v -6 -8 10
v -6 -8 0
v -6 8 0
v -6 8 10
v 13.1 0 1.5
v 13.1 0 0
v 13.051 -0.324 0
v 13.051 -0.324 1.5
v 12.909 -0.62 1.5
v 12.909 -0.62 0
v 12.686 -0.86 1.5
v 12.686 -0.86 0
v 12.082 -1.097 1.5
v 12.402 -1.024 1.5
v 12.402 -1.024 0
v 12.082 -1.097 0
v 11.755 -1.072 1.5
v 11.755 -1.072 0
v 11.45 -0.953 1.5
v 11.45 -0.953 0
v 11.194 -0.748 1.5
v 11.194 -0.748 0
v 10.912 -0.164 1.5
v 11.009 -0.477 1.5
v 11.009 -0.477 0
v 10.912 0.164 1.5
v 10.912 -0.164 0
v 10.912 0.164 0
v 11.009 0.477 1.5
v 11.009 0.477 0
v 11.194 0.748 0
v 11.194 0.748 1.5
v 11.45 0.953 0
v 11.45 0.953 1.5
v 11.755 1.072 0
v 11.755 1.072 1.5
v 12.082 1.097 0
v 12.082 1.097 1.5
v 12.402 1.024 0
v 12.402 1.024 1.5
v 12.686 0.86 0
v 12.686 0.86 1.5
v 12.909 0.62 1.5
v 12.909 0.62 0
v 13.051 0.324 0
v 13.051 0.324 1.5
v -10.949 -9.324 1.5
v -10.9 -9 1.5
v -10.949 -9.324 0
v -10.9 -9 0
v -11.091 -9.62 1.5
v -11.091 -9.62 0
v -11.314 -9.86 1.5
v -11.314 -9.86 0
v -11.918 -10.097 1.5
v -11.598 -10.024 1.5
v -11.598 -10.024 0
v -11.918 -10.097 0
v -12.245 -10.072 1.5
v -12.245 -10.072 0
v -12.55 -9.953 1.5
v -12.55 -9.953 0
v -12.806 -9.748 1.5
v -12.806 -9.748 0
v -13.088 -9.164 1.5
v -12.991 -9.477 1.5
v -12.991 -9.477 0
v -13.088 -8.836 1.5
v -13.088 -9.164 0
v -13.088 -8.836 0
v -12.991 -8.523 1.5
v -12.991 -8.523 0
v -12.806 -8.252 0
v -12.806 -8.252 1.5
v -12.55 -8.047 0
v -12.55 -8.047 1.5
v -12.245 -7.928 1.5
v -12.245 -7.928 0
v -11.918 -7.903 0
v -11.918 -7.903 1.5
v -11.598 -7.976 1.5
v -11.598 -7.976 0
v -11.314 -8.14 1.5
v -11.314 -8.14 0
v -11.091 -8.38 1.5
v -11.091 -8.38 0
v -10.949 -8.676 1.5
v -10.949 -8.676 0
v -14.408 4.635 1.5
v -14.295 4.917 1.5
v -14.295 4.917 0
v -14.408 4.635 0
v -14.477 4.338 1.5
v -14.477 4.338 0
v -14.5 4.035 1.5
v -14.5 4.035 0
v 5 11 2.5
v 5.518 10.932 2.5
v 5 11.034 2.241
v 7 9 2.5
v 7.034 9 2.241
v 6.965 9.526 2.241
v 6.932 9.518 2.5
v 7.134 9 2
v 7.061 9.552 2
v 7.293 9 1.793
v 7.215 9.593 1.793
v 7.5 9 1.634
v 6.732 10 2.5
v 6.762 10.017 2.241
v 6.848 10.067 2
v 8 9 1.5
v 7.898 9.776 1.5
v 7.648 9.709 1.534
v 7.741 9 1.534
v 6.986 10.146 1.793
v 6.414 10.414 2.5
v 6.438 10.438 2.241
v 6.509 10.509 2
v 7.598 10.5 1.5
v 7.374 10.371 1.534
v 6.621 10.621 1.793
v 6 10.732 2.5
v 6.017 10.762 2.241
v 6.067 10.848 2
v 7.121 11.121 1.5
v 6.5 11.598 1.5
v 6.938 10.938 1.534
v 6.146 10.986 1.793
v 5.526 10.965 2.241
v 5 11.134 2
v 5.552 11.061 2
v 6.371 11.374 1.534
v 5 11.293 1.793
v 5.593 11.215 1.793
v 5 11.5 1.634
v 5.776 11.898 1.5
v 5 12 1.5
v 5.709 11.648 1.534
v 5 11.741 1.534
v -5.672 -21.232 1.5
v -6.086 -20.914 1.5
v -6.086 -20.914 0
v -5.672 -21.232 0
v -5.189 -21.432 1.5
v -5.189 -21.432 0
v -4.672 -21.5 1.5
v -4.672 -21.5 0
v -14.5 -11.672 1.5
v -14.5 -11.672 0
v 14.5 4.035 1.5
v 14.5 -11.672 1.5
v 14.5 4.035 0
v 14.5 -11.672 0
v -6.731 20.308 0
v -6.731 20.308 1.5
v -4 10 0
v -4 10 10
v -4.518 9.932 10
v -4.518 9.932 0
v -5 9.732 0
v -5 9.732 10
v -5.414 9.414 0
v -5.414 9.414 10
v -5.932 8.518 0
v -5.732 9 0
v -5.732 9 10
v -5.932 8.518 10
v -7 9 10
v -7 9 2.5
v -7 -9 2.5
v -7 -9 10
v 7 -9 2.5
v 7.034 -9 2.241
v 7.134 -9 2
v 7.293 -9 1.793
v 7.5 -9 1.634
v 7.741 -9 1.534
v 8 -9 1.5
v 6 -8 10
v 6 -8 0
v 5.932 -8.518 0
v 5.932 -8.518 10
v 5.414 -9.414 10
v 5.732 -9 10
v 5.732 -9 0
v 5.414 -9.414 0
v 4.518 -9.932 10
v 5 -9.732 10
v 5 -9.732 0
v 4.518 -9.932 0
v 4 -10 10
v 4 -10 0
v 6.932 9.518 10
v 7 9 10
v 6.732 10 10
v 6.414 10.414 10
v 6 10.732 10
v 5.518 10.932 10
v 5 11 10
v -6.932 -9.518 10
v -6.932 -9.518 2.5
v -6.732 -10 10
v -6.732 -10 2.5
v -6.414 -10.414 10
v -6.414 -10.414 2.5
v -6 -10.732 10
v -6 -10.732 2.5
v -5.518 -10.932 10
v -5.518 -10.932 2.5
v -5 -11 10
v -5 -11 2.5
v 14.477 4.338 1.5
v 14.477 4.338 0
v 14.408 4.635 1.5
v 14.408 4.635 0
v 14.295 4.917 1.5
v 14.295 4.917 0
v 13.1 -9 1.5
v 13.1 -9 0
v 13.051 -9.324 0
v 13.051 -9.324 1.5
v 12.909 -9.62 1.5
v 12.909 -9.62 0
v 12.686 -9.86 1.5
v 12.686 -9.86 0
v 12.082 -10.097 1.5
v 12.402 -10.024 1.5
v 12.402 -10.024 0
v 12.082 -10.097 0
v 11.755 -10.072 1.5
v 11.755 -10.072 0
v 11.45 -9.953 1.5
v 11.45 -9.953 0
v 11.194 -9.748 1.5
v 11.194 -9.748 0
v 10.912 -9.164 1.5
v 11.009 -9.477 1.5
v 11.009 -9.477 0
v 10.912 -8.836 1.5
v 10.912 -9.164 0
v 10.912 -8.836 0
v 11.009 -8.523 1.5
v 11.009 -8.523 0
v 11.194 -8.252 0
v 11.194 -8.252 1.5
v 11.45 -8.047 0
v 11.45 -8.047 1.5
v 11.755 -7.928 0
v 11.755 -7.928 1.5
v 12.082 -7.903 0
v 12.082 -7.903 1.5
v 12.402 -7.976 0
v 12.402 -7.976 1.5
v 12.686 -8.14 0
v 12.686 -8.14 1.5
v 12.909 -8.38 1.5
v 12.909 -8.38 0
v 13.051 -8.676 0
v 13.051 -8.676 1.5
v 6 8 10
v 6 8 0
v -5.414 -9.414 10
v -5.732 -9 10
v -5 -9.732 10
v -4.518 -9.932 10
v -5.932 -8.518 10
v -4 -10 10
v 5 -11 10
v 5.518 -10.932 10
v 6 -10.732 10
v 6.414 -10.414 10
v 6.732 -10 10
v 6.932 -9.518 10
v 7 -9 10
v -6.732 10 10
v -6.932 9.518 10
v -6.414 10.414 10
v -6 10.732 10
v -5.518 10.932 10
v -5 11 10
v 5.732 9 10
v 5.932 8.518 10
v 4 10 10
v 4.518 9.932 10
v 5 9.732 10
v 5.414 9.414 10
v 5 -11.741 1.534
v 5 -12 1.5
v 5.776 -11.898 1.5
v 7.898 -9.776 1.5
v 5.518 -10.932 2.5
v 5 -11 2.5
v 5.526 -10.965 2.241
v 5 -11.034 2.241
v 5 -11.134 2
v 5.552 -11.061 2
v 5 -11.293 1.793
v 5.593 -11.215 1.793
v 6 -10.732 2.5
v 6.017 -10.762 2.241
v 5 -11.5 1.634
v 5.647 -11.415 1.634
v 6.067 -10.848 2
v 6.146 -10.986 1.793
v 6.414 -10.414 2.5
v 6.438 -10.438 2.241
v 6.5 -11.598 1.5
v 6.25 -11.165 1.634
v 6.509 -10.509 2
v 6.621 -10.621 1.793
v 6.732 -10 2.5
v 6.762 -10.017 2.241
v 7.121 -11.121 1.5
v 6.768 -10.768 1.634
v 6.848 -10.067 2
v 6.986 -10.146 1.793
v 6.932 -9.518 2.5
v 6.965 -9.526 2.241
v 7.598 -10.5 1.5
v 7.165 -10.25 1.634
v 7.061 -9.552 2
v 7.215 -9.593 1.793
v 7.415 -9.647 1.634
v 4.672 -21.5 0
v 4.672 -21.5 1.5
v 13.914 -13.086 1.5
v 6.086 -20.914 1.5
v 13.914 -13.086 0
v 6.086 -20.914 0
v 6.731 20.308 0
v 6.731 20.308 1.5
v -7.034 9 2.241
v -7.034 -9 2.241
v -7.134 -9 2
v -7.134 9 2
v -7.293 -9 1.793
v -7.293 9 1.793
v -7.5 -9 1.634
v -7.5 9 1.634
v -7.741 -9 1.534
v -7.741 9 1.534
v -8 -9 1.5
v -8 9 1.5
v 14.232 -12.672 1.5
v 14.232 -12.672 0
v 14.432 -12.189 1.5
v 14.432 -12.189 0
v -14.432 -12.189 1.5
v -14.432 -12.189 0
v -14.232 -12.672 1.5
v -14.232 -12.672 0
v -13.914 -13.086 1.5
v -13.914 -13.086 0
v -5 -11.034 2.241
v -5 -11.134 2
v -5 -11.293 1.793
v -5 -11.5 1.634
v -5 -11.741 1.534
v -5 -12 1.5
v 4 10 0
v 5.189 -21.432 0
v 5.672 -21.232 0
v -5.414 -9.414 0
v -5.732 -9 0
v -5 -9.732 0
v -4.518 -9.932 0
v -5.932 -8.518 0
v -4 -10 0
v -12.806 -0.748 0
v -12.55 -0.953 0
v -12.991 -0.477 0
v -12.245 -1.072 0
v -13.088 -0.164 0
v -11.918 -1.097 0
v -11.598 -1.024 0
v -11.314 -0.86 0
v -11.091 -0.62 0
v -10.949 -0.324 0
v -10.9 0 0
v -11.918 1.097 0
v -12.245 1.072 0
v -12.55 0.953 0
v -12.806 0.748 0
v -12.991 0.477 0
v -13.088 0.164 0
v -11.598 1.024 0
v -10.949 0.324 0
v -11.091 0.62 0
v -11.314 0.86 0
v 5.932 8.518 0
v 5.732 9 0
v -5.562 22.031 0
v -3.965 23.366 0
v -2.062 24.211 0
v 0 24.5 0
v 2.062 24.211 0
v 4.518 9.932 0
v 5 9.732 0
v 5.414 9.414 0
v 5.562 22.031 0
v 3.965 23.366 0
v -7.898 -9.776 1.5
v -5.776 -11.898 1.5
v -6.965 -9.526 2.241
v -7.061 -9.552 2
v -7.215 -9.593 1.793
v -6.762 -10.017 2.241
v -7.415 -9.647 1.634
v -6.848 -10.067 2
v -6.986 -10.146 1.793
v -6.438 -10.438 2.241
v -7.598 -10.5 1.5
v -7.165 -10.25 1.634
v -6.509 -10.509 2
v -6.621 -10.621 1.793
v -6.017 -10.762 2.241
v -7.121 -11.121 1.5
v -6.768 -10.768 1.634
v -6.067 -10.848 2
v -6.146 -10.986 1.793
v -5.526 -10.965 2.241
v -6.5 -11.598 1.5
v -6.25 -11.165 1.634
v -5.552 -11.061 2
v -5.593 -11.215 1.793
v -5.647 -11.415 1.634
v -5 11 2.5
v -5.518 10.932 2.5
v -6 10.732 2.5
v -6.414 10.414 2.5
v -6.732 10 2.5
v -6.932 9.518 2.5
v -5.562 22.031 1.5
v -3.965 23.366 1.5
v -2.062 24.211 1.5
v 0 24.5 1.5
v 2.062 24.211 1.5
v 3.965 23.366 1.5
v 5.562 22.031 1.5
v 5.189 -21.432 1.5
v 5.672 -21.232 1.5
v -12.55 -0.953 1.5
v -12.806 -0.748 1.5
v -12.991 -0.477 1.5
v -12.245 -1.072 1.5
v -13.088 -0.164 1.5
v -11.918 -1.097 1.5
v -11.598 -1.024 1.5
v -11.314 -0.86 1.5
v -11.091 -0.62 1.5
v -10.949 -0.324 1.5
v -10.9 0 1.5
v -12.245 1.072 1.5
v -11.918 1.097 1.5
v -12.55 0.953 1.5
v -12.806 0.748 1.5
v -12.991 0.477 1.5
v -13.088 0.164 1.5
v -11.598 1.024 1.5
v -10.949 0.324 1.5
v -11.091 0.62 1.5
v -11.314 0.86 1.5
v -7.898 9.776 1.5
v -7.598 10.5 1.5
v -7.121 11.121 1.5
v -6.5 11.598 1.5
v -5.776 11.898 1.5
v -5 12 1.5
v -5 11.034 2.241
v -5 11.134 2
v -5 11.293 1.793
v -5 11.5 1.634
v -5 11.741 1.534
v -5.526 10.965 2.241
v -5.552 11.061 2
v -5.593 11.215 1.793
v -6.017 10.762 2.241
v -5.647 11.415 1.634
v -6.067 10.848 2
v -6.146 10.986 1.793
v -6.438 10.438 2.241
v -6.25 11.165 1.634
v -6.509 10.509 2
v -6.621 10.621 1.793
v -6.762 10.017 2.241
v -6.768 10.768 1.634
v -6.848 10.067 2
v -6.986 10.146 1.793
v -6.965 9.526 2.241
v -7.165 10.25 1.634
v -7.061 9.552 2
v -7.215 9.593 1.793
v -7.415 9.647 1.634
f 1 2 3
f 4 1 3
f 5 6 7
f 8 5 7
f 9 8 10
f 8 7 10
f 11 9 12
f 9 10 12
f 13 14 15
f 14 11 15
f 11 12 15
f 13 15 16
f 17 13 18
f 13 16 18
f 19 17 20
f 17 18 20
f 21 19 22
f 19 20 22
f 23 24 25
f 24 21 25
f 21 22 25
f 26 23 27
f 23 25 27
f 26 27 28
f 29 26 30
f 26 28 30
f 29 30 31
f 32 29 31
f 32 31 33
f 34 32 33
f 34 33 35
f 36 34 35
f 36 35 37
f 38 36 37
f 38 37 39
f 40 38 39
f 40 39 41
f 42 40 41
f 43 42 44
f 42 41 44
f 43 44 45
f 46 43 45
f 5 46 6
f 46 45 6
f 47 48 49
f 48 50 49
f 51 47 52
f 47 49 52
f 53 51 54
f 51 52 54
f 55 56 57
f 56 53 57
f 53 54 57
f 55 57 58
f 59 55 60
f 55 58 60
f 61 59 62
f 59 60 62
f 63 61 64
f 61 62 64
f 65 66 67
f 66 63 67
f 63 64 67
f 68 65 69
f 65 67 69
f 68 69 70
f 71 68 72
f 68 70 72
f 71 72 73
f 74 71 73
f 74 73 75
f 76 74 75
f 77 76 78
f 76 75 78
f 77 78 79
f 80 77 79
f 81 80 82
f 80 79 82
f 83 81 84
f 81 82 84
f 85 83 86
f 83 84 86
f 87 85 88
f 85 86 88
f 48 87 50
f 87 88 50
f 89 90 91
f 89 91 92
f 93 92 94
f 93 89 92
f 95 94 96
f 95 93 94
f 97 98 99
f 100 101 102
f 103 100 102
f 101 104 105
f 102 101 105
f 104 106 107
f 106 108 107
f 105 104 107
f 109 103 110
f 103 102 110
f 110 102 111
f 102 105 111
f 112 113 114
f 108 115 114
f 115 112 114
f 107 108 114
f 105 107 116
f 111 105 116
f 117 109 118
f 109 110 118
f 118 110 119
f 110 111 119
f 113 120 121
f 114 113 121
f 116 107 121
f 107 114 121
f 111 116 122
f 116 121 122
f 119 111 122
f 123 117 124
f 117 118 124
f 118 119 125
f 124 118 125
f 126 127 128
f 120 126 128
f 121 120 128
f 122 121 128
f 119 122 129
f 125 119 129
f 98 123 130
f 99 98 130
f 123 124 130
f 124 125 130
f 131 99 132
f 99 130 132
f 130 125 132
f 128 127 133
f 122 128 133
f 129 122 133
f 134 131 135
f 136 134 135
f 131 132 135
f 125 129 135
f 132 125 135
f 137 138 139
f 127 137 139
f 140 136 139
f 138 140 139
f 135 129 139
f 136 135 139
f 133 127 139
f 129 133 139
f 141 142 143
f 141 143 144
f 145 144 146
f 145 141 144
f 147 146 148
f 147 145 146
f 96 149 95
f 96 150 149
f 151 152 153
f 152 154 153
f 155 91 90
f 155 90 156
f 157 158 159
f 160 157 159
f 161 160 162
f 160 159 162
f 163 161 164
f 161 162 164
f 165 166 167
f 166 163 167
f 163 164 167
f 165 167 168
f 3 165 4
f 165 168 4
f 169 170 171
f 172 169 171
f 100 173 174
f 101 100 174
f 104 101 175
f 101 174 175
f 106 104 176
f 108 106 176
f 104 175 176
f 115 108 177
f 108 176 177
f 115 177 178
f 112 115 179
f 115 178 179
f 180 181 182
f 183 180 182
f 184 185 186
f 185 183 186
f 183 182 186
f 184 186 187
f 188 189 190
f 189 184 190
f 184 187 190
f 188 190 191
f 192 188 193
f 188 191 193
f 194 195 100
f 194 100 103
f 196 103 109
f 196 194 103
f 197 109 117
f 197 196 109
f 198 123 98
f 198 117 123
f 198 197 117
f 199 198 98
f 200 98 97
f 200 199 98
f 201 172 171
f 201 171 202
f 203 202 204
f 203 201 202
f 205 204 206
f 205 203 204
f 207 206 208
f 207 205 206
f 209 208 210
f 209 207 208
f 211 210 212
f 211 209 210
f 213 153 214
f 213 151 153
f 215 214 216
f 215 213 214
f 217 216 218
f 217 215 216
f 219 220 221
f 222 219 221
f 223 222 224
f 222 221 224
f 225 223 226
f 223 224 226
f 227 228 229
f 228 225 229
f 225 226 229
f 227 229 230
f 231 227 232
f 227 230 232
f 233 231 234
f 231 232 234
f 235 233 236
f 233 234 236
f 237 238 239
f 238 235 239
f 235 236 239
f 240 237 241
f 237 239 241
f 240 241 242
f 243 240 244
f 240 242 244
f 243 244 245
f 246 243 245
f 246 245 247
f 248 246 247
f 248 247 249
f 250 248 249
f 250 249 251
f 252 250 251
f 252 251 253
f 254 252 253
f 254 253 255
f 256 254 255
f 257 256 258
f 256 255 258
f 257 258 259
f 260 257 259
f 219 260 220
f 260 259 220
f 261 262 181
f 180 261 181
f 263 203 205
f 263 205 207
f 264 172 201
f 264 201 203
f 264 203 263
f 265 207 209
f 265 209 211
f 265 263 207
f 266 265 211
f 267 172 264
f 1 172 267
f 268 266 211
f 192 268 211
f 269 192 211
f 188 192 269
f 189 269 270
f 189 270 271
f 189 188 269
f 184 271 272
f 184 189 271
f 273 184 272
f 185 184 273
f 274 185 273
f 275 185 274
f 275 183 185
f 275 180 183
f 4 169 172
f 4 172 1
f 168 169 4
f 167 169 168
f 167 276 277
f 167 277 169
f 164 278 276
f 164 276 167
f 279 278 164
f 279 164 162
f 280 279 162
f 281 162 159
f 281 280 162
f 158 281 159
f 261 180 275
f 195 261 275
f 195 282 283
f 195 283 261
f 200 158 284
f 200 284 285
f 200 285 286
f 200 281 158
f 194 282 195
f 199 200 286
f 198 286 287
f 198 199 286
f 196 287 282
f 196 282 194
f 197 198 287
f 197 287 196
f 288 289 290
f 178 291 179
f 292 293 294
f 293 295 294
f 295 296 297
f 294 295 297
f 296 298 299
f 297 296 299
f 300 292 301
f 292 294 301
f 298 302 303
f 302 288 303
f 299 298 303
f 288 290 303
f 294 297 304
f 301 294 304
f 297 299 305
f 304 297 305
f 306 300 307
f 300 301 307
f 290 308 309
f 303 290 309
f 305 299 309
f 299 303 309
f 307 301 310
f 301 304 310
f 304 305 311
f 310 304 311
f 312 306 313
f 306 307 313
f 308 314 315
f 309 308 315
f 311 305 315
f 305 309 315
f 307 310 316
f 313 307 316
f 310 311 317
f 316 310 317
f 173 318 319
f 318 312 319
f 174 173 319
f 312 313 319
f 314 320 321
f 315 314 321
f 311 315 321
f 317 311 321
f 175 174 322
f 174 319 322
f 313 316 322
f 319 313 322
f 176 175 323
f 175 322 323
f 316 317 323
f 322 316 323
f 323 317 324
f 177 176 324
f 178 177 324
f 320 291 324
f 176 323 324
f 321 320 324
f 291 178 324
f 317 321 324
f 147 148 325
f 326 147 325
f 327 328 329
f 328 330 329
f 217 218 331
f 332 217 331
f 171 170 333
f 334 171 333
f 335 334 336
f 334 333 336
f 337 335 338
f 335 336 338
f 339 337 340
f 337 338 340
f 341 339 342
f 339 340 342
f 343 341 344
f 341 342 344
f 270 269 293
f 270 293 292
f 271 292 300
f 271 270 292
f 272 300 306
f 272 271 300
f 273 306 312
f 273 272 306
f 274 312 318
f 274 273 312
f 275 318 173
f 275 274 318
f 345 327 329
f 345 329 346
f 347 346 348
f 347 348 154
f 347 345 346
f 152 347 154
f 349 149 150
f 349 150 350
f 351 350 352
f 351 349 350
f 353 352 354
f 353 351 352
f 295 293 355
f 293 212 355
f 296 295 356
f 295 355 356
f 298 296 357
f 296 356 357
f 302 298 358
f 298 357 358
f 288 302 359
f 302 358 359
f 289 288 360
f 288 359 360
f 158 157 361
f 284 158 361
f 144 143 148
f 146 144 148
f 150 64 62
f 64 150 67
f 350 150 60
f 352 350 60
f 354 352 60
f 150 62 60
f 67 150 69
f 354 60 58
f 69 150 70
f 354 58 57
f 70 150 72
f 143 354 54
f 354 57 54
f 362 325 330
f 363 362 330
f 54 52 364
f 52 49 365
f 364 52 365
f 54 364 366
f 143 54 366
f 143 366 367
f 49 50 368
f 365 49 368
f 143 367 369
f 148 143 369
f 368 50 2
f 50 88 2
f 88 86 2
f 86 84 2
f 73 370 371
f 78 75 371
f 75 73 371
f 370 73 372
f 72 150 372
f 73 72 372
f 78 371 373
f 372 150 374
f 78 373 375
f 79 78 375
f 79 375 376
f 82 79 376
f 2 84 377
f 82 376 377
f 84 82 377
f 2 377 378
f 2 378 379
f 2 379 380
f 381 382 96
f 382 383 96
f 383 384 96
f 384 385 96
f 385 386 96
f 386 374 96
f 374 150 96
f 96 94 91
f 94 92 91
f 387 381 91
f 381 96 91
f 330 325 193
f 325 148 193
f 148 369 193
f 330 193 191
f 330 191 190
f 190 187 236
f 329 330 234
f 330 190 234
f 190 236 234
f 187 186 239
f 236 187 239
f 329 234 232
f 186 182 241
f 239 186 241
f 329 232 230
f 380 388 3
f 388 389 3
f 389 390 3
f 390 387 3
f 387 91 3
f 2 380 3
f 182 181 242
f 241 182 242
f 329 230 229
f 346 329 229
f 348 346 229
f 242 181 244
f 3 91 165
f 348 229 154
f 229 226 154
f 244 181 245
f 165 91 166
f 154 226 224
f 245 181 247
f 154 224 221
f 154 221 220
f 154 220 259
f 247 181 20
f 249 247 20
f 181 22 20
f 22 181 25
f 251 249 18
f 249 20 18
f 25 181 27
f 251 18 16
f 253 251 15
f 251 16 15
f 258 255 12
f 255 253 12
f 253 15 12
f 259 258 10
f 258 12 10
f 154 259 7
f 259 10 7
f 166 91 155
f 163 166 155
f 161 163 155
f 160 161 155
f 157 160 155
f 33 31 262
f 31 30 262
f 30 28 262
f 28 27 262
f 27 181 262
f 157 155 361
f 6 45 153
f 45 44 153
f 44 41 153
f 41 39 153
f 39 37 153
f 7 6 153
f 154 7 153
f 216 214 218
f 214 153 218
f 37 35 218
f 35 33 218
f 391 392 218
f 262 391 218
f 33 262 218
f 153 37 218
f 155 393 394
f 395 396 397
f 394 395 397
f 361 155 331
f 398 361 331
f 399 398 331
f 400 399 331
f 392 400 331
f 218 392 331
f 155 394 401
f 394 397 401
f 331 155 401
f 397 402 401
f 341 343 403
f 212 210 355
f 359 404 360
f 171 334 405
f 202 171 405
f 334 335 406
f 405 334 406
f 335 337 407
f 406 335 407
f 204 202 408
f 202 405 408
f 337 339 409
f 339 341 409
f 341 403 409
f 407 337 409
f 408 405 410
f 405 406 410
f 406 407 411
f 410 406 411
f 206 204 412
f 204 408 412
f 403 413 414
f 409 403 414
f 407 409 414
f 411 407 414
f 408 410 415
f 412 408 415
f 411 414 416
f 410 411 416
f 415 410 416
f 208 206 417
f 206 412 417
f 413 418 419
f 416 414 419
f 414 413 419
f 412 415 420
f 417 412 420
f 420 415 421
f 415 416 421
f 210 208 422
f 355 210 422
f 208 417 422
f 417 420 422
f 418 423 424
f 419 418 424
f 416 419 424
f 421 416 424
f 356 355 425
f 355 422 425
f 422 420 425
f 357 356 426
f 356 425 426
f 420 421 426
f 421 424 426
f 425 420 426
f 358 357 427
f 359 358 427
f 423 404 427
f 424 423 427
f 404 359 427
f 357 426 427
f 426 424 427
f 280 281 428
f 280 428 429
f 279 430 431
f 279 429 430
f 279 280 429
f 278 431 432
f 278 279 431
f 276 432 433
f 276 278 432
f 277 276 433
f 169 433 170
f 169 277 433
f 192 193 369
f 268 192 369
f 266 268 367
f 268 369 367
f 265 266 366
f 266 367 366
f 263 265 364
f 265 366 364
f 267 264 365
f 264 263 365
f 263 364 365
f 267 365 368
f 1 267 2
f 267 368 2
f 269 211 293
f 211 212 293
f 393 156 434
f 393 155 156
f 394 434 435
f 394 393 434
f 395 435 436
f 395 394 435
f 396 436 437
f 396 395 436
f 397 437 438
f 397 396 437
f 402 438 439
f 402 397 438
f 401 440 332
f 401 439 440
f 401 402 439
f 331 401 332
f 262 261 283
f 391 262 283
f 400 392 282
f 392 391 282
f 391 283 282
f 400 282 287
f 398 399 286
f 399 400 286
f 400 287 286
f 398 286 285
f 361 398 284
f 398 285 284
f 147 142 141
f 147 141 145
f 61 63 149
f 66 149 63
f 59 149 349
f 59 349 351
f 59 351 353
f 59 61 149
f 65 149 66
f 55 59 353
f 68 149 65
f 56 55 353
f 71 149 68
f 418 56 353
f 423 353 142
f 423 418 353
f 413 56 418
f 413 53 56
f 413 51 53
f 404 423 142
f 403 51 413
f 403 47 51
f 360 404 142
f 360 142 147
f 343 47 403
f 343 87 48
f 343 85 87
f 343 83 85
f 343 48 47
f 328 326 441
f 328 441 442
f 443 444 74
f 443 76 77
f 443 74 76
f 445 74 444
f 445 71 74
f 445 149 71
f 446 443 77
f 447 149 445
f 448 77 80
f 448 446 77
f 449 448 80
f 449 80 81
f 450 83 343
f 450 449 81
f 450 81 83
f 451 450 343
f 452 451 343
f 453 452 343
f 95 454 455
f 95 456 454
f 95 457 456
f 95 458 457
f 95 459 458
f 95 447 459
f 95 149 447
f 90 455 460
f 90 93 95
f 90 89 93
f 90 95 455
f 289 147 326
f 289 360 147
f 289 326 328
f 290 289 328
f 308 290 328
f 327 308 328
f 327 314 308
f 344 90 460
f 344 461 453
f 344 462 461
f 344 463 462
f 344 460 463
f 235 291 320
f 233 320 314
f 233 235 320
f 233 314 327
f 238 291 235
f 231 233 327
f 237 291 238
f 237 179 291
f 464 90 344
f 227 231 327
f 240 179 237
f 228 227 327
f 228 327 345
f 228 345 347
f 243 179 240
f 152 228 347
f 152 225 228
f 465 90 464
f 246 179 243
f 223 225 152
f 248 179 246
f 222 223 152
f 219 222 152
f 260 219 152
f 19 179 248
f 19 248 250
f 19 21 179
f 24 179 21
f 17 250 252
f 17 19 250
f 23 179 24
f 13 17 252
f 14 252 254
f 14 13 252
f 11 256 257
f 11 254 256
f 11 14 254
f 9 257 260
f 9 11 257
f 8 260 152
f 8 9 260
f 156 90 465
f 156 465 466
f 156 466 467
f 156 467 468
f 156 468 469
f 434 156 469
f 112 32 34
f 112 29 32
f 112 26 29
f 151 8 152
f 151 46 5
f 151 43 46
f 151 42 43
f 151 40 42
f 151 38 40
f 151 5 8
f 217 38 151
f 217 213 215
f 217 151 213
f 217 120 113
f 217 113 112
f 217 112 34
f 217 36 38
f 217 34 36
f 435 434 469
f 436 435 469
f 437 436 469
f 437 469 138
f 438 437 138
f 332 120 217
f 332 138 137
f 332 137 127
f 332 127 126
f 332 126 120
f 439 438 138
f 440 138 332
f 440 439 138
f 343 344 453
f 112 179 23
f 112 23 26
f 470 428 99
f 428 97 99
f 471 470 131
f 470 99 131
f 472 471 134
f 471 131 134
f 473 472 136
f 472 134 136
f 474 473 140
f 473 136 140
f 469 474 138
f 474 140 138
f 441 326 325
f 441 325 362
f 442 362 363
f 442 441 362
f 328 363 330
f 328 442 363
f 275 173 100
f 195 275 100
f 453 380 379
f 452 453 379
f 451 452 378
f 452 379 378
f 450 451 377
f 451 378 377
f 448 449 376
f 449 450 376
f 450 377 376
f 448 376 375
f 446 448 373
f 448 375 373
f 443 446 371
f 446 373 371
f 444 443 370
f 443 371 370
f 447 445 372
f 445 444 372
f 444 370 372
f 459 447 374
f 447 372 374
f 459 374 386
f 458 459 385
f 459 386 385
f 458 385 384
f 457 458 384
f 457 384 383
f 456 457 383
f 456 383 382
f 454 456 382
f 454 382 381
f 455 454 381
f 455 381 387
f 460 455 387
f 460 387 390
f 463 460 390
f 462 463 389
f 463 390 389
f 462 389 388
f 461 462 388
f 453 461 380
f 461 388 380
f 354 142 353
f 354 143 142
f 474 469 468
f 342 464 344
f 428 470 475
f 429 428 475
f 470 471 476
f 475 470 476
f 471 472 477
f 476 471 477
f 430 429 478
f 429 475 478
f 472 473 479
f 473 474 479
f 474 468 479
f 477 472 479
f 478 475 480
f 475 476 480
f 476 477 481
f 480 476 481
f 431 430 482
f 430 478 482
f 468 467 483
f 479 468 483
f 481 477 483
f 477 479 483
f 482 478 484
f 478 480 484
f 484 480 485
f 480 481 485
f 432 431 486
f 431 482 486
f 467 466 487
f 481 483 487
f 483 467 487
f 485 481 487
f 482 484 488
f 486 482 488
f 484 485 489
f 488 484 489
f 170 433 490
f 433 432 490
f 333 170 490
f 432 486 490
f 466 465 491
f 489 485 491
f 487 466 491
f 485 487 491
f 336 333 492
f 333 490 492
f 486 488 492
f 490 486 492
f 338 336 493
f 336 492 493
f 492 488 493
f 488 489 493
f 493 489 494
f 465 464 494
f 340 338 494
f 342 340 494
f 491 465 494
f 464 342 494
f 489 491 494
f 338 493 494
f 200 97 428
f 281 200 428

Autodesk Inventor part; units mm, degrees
ref_plane "YZ Plane" through (0, 0, 0) normal (1, 0, 0) x (0, 1, 0)
ref_plane "XZ Plane" through (0, 0, 0) normal (0, 1, 0) x (-1, 0, 0)
ref_plane "XY Plane" through (0, 0, 0) normal (0, 0, 1) x (1, 0, 0)
sketch "Sketch1" plane through (0, 0, 0) normal (0, 0, 1) x (1, 0, 0)
  line L0 (-6, 10) -> (6, 10)
  line L1 (6, 10) -> (6, -10)
  line L2 (6, -10) -> (-6, -10)
  line L3 (-6, -10) -> (-6, 10)
  line L4 (-5.5, -21.5) -> (5.5, -21.5)
  line L5 (5.5, -21.5) -> (14.5, -12.5)
  line L6 (14.5, -12.5) -> (14.5, 4.5)
  line L7 (-5.5, -21.5) -> (-14.5, -12.5)
  line L8 (-14.5, -12.5) -> (-14.5, 4.5)
  line L9 (0, -32.2278) -> (0, 36.9858) construction
  circle A0 centre (0, 17) radius 7.5
  line L10 (-14.5, 4.5) -> (-6.731, 20.308)
  line L11 (14.5, 4.5) -> (6.731, 20.308)
  circle A1 centre (-12, 0) radius 1.1
  circle A2 centre (-12, -9) radius 1.1
  circle A3 centre (12, 0) radius 1.1
  circle A4 centre (12, -9) radius 1.1
  line L12 (7, 11) -> (-7, 11)
  line L13 (-7, 11) -> (-7, -11)
  line L14 (-7, -11) -> (7, -11)
  line L15 (7, -11) -> (7, 11)
  circle A5 centre (-12, 0) radius 2.6
  circle A6 centre (-12, -9) radius 2.6
  circle A7 centre (12, 0) radius 2.6
  circle A8 centre (12, -9) radius 2.6
  point P0 (0, 0)
  point P1 (0, -21.5)
  point P2 (0, 2.379)
  dimension "d0" = 12
  dimension "d1" = 20
  dimension "d2" = 10
  dimension "d3" = 6
  dimension "d4" = 11
  dimension "d5" = 21.5
  dimension "d6" = 0
  dimension "d7" = 135
  dimension "d8" = 135
  dimension "d9" = 14.5
  dimension "d10" = 14.5
  dimension "d11" = 15
  dimension "d12" = 38.5
  dimension "d13" = 17
  dimension "d14" = 17
  dimension "d15" = 2.2
  dimension "d18" = 9
  dimension "d21" = 24
  dimension "d24" = 12
  dimension "d25" = 0
  dimension "d30" = 1
  dimension "d34" = 1.5
  dimension "d35" = 1.5
  dimension "d36" = 1.5
  dimension "d37" = 1.5
extrude "Extrusion1" add sketch "Sketch1" along normal blind 1.5 contours L3 L2 L1 L0 A0 L12 L15 L14 L13 | A0 L12 L0 | L12 L13 L14 L15 A0 L11 L6 A7 A8 L5 L4 L7 L8 A6 A5 L10 | A0 L12 | A5 L8 | L6 A7 | A6 L8 | L6 A8 picked at (-14.0333, 0) picked at (14.0333, 0) picked at (-14.0333, -9) picked at (14.0333, -9)
extrude "Extrusion2" add sketch "Sketch1" along normal blind 10 contours L3 L2 L1 L0 A0 L12 L15 L14 L13 | A0 L12 L0
fillet "Fillet1" radius 2 14 edges at (-7, -11, 5.75) (7, -11, 5.75) (7, 11, 5.75) (5.5, -21.5, 0.75) (-5.5, -21.5, 0.75) (14.5, -12.5, 0.75) (-14.5, -12.5, 0.75) (14.5, 4.5, 0.75) (-7, 11, 5.75) (-14.5, 4.5, 0.75) (6, 10, 5) (-6, 10, 5) (-6, -10, 5) (6, -10, 5)
extrude "Extrusion3" [suppressed]
fillet "Fillet2" radius 1 8 edges at (7, 0, 1.5) (6.4142, 10.4142, 1.5) (0, 11, 1.5) (-6.4142, 10.4142, 1.5) (-7, 0, 1.5) (-6.4142, -10.4142, 1.5) (0, -11, 1.5) (6.4142, -10.4142, 1.5)
equation "\"d2\" = 0.5 * d1"
equation "\"d3\" = 0.5 * d0"
equation "\"d8\" = d7"
equation "\"d10\" = d9"
equation "\"d14\" = d13"
equation "\"d24\" = 0.5 * d21"
equation "\"d35\" = d34"
equation "\"d36\" = d34"
equation "\"d37\" = d34"
properties part number "skye_airspeed"
